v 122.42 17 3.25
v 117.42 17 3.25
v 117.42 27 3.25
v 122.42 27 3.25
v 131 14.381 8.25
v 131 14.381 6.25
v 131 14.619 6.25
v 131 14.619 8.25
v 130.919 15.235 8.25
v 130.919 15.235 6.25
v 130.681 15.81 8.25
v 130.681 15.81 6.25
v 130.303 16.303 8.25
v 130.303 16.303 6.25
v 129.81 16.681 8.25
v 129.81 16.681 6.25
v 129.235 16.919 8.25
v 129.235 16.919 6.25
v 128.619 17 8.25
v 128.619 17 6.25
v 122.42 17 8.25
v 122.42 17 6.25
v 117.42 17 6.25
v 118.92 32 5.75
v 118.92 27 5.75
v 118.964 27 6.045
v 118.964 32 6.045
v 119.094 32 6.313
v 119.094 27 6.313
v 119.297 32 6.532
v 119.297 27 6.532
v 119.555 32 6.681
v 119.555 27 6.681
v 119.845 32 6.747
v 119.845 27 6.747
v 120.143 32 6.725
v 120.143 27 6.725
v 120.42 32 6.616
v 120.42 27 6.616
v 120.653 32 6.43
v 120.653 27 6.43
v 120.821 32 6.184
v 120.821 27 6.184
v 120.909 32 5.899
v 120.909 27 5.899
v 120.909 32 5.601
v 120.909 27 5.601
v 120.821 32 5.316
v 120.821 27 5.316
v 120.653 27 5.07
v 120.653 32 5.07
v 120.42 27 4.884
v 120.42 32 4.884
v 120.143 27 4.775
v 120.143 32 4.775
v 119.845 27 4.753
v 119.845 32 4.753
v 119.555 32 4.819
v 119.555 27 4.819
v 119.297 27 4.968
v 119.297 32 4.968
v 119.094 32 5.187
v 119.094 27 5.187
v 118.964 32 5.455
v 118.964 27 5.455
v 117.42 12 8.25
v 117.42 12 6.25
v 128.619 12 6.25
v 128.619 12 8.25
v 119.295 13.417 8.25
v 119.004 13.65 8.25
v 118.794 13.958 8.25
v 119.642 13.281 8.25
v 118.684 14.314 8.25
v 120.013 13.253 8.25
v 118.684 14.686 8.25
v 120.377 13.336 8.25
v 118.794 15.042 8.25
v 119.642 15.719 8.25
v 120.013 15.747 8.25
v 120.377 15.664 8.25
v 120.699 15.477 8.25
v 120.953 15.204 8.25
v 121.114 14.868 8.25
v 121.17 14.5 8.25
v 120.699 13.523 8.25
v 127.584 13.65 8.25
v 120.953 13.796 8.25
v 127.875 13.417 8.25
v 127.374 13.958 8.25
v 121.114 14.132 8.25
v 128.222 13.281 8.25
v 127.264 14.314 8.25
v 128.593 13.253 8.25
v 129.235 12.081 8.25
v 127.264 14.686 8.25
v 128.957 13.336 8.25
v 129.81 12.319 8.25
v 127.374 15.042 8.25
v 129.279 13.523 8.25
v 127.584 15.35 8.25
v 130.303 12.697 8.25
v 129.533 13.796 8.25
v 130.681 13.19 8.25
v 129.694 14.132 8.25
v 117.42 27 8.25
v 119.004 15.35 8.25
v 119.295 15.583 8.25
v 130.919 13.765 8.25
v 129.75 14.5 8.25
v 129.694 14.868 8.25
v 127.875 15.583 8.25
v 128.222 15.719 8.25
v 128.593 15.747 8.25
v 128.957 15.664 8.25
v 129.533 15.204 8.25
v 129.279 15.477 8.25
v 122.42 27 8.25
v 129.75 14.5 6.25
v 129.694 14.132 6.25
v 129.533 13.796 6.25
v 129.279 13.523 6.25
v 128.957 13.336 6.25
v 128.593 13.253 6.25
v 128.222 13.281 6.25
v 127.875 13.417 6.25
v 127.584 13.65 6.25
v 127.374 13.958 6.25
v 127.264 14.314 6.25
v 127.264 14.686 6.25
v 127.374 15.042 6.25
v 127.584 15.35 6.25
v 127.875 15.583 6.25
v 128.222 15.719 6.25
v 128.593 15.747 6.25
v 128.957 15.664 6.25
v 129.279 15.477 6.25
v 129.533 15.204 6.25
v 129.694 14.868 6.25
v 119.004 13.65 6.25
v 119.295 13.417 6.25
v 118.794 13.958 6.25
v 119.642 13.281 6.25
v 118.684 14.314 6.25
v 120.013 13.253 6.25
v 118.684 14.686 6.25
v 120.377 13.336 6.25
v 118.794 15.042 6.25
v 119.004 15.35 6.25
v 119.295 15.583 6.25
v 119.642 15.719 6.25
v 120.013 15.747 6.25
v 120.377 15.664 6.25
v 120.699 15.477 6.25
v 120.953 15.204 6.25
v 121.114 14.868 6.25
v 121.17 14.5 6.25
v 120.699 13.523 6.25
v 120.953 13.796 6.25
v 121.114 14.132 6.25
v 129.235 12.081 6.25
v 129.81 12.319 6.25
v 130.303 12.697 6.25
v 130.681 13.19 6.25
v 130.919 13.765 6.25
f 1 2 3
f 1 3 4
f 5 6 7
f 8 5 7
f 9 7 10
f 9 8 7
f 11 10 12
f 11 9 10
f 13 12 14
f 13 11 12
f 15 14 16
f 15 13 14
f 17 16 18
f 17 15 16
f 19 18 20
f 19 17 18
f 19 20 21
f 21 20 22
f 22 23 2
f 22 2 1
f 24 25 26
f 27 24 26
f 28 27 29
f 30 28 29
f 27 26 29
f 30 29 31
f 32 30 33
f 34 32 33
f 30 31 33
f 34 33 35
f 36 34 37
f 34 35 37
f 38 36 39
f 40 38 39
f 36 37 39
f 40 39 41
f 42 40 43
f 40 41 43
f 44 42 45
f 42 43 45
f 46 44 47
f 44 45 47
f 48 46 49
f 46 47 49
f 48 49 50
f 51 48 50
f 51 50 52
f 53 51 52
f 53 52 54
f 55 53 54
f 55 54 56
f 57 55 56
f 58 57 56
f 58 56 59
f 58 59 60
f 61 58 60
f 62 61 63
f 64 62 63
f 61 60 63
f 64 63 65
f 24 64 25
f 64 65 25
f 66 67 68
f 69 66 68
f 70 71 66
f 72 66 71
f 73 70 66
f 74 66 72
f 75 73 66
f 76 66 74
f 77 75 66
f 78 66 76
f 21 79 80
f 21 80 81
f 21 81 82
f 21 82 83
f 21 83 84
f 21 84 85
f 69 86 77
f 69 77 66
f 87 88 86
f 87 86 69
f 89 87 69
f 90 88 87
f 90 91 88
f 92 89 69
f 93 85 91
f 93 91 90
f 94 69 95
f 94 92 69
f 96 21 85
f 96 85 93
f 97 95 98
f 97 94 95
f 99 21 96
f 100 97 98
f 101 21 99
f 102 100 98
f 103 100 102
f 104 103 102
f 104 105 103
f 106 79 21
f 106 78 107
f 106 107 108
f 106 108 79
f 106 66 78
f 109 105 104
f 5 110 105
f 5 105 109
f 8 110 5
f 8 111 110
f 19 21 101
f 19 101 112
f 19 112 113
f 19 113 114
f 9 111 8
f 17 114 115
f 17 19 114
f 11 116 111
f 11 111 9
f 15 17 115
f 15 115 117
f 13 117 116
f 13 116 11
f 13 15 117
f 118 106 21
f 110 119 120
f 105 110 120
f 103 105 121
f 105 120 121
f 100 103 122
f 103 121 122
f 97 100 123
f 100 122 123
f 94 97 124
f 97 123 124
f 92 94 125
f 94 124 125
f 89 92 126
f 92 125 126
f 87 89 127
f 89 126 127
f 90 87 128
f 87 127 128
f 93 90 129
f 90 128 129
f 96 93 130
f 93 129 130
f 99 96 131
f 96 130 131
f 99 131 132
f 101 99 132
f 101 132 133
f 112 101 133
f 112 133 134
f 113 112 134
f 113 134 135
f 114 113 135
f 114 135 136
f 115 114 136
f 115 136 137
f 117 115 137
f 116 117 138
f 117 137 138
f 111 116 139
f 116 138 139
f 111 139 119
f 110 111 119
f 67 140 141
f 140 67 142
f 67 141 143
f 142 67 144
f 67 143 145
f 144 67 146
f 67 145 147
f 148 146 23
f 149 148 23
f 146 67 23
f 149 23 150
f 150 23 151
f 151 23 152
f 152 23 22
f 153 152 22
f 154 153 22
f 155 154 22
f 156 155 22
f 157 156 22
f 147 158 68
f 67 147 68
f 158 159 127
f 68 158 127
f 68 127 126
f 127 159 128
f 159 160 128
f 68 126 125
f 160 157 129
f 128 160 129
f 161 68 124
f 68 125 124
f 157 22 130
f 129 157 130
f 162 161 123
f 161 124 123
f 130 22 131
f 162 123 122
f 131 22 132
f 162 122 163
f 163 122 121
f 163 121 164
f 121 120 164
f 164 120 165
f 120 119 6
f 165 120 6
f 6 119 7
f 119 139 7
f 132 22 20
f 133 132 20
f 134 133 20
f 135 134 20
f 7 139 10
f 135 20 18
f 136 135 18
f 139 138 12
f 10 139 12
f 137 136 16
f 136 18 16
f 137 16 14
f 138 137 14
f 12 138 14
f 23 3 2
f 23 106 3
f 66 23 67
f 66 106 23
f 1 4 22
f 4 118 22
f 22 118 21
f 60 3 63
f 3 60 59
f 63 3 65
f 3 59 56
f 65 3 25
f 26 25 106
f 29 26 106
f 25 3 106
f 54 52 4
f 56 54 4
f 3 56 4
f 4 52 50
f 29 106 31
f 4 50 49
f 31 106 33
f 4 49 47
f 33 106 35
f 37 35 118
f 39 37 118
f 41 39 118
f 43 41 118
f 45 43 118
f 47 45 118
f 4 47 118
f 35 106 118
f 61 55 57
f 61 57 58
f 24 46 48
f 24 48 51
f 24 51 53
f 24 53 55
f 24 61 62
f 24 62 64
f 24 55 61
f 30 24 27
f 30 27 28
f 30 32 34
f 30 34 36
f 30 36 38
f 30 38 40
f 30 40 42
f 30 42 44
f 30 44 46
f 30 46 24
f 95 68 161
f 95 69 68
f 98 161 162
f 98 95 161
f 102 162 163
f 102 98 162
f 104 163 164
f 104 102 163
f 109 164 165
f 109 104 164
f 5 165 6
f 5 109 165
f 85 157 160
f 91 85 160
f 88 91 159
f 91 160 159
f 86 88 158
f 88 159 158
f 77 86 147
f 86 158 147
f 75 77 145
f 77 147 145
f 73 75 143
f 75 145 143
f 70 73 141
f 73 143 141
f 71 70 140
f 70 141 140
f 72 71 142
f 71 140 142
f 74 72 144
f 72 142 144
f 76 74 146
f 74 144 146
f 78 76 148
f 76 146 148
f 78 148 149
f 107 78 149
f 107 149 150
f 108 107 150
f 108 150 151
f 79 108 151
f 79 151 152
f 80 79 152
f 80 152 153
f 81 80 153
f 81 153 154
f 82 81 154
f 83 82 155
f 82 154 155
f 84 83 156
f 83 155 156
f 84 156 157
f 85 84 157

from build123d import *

# Parameters (mm, degrees)
PAD025_DEPTH    = 2
FILLET003_R     = 2.380952
SKETCH049_R     = 1.25
POCKET014_DEPTH = 2
SKETCH050_W     = 5
SKETCH050_H     = 10
PAD026_DEPTH    = 3
SKETCH051_R     = 1
PAD027_DEPTH    = 5


with BuildPart() as part:
    # Sketch048 → Pad025 (new body)
    with BuildSketch(Plane.XY):
        Polygon((-2.5, -2.5), (11.08, -2.5), (11.08, 2.5), (2.5, 2.5), (2.5, 12.5), (-2.5, 12.5), align=None)
    extrude(amount=PAD025_DEPTH)

    # Fillet003
    fillet003_edges = [part.edges().sort_by_distance(p)[0] for p in [
        (11.08, 2.5, 1),
        (11.08, -2.5, 1),
    ]]
    fillet(fillet003_edges, radius=FILLET003_R)

    # Sketch049 (on Face2 of Fillet003) → Pocket014 (cut)
    with BuildSketch(Plane(origin=(0, 0, 0), x_dir=(1, 0, 0), z_dir=(0, 0, -1))):
        Circle(SKETCH049_R)
        with Locations((8.58, 0)):
            Circle(SKETCH049_R)
    extrude(amount=-POCKET014_DEPTH, mode=Mode.SUBTRACT)

    # Sketch050 (on Face2 of Fillet003) → Pad026 (join)
    with BuildSketch(Plane(origin=(0, 0, 0), x_dir=(1, 0, 0), z_dir=(0, 0, -1))):
        with Locations((0, -7.5)):
            Rectangle(SKETCH050_W, SKETCH050_H)
    extrude(amount=PAD026_DEPTH)

    # Sketch051 (on Face12 of Pad026) → Pad027 (join)
    with BuildSketch(Plane(origin=(0, 12.5, 0), x_dir=(-1, 0, 0), z_dir=(0, 1, 0))):
        with Locations((0, -0.5)):
            Circle(SKETCH051_R)
    extrude(amount=PAD027_DEPTH)


with BuildPart() as part_1:
    # Body010 placement: moved
    add(part.part.moved(Location((119.92, 14.5, 6.25))))


solid = part_1.part
